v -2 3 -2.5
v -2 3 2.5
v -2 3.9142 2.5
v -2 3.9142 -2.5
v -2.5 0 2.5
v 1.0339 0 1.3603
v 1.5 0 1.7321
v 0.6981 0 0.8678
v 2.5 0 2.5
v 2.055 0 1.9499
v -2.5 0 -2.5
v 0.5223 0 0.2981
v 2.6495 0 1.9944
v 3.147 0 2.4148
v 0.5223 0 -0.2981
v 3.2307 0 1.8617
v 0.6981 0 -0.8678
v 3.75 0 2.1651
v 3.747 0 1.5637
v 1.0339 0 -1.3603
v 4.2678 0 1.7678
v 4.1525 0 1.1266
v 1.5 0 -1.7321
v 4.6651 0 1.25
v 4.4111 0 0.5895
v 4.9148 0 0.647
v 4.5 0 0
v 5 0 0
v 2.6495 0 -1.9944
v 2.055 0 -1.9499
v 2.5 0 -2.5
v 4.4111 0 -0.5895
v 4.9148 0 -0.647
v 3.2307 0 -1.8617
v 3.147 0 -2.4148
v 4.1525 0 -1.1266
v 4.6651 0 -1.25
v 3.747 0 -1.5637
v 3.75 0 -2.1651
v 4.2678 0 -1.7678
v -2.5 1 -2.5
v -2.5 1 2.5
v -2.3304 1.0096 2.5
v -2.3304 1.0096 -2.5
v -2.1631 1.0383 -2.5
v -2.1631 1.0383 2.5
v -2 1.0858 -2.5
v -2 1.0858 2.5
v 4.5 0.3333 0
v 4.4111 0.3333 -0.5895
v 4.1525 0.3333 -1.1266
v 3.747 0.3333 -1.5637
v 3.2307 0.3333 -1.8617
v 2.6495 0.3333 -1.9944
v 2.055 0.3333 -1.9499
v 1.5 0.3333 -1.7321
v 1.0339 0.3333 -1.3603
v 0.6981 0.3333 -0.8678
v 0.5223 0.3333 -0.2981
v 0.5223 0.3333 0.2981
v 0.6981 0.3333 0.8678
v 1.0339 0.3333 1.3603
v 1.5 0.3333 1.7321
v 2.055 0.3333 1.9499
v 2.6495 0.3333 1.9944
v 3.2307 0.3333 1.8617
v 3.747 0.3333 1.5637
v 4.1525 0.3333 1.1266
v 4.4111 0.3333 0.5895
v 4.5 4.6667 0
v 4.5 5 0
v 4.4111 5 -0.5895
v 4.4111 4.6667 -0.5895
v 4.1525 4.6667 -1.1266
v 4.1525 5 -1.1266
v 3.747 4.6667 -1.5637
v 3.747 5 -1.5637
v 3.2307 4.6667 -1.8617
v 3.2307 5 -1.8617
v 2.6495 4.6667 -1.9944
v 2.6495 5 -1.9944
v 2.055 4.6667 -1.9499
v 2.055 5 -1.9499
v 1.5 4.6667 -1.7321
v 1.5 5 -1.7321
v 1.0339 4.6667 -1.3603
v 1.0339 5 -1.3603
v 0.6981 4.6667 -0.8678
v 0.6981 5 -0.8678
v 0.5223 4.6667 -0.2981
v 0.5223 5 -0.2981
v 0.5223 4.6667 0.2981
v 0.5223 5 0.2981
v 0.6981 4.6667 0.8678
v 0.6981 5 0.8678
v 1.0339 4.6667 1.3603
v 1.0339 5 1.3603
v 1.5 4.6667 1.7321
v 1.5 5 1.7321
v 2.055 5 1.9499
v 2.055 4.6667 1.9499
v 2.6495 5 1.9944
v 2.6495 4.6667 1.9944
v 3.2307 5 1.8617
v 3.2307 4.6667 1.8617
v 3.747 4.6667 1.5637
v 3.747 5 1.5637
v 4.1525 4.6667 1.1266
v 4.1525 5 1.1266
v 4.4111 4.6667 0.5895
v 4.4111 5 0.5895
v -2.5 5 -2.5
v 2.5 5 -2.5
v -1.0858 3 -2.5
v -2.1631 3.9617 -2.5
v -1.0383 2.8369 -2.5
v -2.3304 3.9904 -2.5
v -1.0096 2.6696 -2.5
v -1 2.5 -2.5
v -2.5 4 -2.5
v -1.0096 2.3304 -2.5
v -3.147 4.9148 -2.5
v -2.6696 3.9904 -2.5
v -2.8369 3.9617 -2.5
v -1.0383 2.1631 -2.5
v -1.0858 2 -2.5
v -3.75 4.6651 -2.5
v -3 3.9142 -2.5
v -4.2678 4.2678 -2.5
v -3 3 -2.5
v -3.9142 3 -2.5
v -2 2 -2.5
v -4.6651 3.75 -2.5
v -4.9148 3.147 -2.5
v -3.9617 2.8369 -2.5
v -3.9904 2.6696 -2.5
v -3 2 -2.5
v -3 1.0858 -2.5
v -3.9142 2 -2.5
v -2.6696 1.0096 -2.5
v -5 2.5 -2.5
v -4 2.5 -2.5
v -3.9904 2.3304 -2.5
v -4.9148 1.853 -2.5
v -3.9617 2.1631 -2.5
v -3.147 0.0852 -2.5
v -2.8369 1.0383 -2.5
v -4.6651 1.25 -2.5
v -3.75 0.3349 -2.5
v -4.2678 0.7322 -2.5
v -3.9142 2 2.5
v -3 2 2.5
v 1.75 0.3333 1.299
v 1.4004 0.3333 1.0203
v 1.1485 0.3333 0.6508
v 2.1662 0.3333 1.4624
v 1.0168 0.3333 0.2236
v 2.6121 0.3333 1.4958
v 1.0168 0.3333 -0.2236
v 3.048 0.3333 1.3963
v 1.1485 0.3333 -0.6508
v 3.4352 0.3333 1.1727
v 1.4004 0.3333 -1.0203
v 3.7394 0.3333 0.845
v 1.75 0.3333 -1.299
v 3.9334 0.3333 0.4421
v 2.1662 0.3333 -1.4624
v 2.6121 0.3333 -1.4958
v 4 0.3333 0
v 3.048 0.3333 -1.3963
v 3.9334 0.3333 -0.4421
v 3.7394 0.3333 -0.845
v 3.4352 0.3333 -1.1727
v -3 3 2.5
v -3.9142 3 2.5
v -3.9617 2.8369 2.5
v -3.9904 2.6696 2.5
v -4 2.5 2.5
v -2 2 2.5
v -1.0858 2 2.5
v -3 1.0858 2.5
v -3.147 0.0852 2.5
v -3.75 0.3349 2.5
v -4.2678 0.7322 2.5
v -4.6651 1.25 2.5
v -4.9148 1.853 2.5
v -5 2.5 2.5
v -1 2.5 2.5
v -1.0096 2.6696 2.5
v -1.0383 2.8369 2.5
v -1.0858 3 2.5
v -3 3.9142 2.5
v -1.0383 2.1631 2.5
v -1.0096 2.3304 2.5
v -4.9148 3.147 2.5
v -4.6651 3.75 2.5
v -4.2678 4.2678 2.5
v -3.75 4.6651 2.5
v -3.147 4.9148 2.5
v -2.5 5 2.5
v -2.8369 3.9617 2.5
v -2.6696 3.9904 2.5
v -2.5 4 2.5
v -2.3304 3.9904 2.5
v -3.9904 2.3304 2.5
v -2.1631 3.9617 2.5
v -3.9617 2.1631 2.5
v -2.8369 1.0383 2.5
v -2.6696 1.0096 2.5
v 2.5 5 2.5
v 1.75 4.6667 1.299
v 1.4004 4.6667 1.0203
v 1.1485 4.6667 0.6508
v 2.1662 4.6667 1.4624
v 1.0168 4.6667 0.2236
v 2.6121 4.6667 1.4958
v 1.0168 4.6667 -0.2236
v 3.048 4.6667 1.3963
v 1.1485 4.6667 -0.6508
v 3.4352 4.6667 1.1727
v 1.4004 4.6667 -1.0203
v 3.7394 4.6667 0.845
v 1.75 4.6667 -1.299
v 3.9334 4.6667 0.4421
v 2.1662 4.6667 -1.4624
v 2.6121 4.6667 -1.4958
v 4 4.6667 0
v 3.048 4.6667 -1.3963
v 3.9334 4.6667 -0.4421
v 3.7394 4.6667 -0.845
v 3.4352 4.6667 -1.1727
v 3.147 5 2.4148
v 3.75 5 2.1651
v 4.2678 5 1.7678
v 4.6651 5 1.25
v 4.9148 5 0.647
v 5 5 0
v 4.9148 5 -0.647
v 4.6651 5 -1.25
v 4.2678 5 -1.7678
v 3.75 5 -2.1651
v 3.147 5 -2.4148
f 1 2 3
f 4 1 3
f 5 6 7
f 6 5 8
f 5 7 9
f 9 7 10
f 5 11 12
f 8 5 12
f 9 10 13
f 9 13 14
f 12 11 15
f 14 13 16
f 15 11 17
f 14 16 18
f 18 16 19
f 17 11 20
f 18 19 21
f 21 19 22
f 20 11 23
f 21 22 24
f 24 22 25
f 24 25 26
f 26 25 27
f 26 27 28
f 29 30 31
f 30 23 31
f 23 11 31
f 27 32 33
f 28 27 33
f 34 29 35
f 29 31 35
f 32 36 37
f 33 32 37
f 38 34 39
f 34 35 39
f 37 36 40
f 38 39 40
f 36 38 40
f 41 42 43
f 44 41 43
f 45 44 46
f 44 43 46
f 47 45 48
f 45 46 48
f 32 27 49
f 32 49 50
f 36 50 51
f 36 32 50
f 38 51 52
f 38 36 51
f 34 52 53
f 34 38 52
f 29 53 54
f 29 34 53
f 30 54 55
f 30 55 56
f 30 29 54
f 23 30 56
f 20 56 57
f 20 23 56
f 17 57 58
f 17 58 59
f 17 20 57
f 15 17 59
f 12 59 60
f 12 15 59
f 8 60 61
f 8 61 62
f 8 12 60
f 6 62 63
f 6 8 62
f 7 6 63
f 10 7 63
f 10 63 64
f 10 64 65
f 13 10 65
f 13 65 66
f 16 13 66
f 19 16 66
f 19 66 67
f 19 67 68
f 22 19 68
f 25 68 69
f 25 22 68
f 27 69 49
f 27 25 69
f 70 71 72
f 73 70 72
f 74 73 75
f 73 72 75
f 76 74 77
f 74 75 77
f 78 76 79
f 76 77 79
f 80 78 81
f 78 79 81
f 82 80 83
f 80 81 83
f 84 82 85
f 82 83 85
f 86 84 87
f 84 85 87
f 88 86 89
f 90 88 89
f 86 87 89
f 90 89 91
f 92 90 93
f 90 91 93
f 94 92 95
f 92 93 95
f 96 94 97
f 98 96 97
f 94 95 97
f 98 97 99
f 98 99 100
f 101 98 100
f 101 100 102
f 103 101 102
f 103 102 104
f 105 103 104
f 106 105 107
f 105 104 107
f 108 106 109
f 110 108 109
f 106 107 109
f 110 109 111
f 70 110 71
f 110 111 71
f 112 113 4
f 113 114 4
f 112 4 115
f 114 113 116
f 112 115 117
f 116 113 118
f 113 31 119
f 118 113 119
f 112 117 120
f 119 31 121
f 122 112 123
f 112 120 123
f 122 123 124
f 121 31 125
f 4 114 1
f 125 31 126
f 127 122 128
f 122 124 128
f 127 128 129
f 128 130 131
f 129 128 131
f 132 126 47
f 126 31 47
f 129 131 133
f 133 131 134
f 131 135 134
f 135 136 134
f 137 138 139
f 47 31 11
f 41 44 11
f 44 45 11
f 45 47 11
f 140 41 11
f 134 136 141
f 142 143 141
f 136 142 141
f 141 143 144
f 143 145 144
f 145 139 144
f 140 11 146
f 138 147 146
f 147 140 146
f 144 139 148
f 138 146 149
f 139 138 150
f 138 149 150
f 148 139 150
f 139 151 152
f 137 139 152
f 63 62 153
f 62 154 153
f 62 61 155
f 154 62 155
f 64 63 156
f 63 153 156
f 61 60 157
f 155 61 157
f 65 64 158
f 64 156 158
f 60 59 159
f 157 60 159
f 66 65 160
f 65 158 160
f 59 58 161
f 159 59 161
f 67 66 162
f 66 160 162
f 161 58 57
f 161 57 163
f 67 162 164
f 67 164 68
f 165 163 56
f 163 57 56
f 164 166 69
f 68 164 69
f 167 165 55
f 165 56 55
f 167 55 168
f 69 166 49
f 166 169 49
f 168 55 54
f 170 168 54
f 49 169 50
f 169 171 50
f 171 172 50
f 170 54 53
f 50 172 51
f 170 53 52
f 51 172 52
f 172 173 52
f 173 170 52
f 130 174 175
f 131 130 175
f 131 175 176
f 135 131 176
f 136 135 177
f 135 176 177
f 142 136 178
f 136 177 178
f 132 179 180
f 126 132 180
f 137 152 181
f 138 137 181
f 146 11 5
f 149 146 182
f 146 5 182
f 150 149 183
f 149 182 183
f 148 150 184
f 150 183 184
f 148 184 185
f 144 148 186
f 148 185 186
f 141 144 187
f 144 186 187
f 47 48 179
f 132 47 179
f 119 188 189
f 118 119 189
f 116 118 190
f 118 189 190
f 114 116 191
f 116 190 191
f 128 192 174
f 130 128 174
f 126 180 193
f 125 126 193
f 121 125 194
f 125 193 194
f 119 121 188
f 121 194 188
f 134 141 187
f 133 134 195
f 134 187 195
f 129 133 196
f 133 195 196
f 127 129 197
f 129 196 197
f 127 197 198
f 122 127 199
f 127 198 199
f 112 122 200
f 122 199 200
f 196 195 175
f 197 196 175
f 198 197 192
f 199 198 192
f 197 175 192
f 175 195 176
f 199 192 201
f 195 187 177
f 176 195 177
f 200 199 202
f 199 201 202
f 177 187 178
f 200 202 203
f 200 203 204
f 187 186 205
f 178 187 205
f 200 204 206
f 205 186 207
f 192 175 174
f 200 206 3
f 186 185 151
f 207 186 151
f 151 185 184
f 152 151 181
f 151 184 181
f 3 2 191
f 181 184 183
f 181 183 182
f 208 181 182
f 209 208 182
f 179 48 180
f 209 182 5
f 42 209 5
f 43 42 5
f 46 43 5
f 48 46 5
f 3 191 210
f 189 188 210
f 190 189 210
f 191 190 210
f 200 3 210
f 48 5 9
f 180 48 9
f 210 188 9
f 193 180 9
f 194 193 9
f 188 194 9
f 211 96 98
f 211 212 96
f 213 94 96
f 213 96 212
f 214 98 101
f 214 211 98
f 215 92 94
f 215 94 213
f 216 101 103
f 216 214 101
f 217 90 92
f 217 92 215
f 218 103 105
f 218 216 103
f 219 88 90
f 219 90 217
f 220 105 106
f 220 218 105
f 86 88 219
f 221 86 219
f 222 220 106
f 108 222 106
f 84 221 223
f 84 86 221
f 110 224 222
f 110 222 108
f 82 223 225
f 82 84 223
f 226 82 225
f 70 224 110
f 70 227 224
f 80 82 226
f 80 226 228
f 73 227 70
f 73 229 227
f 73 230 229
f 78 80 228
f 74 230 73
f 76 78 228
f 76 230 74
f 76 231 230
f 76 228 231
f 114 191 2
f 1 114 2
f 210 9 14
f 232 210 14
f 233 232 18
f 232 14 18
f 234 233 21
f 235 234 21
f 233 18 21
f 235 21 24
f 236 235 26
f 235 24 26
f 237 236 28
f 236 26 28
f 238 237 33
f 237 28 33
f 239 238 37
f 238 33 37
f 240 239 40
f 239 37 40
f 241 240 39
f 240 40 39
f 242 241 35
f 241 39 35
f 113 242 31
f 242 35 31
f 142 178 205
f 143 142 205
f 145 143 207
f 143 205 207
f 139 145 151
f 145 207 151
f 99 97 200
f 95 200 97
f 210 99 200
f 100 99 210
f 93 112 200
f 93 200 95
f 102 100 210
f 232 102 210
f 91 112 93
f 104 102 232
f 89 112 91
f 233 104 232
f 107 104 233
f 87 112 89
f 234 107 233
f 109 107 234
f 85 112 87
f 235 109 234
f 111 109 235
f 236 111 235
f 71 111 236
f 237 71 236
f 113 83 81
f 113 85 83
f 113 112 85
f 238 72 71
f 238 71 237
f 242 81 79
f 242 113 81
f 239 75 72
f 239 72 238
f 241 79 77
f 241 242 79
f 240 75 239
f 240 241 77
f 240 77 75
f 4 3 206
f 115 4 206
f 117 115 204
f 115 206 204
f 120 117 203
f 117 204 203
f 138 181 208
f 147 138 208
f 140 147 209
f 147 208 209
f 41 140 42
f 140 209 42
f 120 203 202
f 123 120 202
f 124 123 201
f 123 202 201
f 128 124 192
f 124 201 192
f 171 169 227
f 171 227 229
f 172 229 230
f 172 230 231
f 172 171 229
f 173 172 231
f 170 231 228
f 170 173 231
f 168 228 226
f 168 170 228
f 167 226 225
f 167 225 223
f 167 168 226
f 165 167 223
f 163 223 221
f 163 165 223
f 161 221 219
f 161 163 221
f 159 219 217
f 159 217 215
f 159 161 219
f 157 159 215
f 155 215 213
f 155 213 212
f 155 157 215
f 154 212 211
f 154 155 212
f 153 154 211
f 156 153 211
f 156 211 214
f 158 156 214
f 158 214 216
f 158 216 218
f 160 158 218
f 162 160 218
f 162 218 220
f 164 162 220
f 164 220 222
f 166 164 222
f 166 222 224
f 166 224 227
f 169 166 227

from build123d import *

# Parameters (mm, degrees)
SKETCH1_R           = 2.5
SKETCH1_R_2         = 2
SKETCH1_R_3         = 1.5
BOSS_EXTRUDE1_DEPTH = 5
SKETCH1_3_R         = 2
SKETCH1_3_R_2       = 1.5
CUT_EXTRUDE1_DEPTH  = 0.333333333
SKETCH2_R           = 2
SKETCH2_R_2         = 1.5
CUT_EXTRUDE2_DEPTH  = 0.333333333
CUT_EXTRUDE3_REACH  = 7
SKETCH3_W           = 1
SKETCH3_H           = 1


with BuildPart() as part:
    # Sketch1 → Boss-Extrude1 (new body)
    with BuildSketch(Plane(origin=(0, 0, 0), x_dir=(1, 0, 0), z_dir=(0, 1, 0))):
        with BuildLine():
            Line((-5, 2.5), (-5, -2.5))
            Line((-5, -2.5), (2.5, -2.5))
            ThreePointArc((2.5, -2.5), (0, 0), (2.5, 2.5))
            Line((2.5, 2.5), (-5, 2.5))
        make_face()
        with Locations((2.5, 0)):
            Circle(SKETCH1_R)
        with Locations((2.5, 0)):
            Circle(SKETCH1_R_2, mode=Mode.SUBTRACT)
        with Locations((2.5, 0)):
            Circle(SKETCH1_R_2)
        with Locations((2.5, 0)):
            Circle(SKETCH1_R_3, mode=Mode.SUBTRACT)
    extrude(amount=BOSS_EXTRUDE1_DEPTH)

    # Sketch1<3> → Cut-Extrude1 (cut)
    with BuildSketch(Plane(origin=(0, 0, 0), x_dir=(1, 0, 0), z_dir=(0, 1, 0))):
        with Locations((2.5, 0)):
            Circle(SKETCH1_3_R)
        with Locations((2.5, 0)):
            Circle(SKETCH1_3_R_2, mode=Mode.SUBTRACT)
    extrude(amount=CUT_EXTRUDE1_DEPTH, mode=Mode.SUBTRACT)

    # Sketch2 → Cut-Extrude2 (cut)
    with BuildSketch(Plane(origin=(0, 5, 0), x_dir=(1, 0, 0), z_dir=(0, 1, 0))):
        with Locations((2.5, 0)):
            Circle(SKETCH2_R)
        with Locations((2.5, 0)):
            Circle(SKETCH2_R_2, mode=Mode.SUBTRACT)
    extrude(amount=-CUT_EXTRUDE2_DEPTH, mode=Mode.SUBTRACT)

    # Sketch3 → Cut-Extrude3 (cut, up to next)
    with BuildSketch(Plane.XY.offset(2.5), mode=Mode.PRIVATE) as cut_extrude3_sk1:
        with BuildLine():
            Line((-2.5, 5), (-5, 5))
            Line((-5, 5), (-5, 2.5))
            ThreePointArc((-5, 2.5), (-4.267766953, 4.267766953), (-2.5, 5))
        make_face()
    cut_extrude3_tool1 = extrude(cut_extrude3_sk1.sketch, amount=-CUT_EXTRUDE3_REACH, mode=Mode.PRIVATE) & part.part
    add(cut_extrude3_tool1.solids().sort_by_distance((-4.44158, 4.44158, 2.5))[0], mode=Mode.SUBTRACT)
    # Sketch3 → Cut-Extrude3 (cut, up to next)
    with BuildSketch(Plane.XY.offset(2.5), mode=Mode.PRIVATE) as cut_extrude3_sk2:
        with BuildLine():
            ThreePointArc((-2.5, 0), (-4.267766953, 0.732233047), (-5, 2.5))
            Line((-5, 2.5), (-5, 0))
            Line((-5, 0), (-2.5, 0))
        make_face()
    cut_extrude3_tool2 = extrude(cut_extrude3_sk2.sketch, amount=-CUT_EXTRUDE3_REACH, mode=Mode.PRIVATE) & part.part
    add(cut_extrude3_tool2.solids().sort_by_distance((-4.44158, 0.55842, 2.5))[0], mode=Mode.SUBTRACT)
    # Sketch3 → Cut-Extrude3 (cut, up to next)
    with BuildSketch(Plane.XY.offset(2.5), mode=Mode.PRIVATE) as cut_extrude3_sk3:
        with BuildLine():
            Line((-3.914213562, 2), (-3, 2))
            Line((-3, 2), (-3, 3))
            Line((-3, 3), (-3.914213562, 3))
            ThreePointArc((-3.914213562, 3), (-3.978397839, 2.753652968), (-4, 2.5))
            ThreePointArc((-4, 2.5), (-3.978397839, 2.246347032), (-3.914213562, 2))
        make_face()
    cut_extrude3_tool3 = extrude(cut_extrude3_sk3.sketch, amount=-CUT_EXTRUDE3_REACH, mode=Mode.PRIVATE) & part.part
    add(cut_extrude3_tool3.solids().sort_by_distance((-3.486204, 2.5, 2.5))[0], mode=Mode.SUBTRACT)
    # Sketch3 → Cut-Extrude3 (cut, up to next)
    with BuildSketch(Plane.XY.offset(2.5), mode=Mode.PRIVATE) as cut_extrude3_sk4:
        with BuildLine():
            Line((-3, 3.914213562), (-3, 3))
            Line((-3, 3), (-2, 3))
            Line((-2, 3), (-2, 3.914213562))
            ThreePointArc((-2, 3.914213562), (-2.246347032, 3.978397839), (-2.5, 4))
            ThreePointArc((-2.5, 4), (-2.753652968, 3.978397839), (-3, 3.914213562))
        make_face()
    cut_extrude3_tool4 = extrude(cut_extrude3_sk4.sketch, amount=-CUT_EXTRUDE3_REACH, mode=Mode.PRIVATE) & part.part
    add(cut_extrude3_tool4.solids().sort_by_distance((-2.5, 3.486204, 2.5))[0], mode=Mode.SUBTRACT)
    # Sketch3 → Cut-Extrude3 (cut, up to next)
    with BuildSketch(Plane.XY.offset(2.5), mode=Mode.PRIVATE) as cut_extrude3_sk5:
        with Locations((-2.5, 2.5)):
            Rectangle(SKETCH3_W, SKETCH3_H)
    cut_extrude3_tool5 = extrude(cut_extrude3_sk5.sketch, amount=-CUT_EXTRUDE3_REACH, mode=Mode.PRIVATE) & part.part
    add(cut_extrude3_tool5.solids().sort_by_distance((-2.5, 2.5, 2.5))[0], mode=Mode.SUBTRACT)
    # Sketch3 → Cut-Extrude3 (cut, up to next)
    with BuildSketch(Plane.XY.offset(2.5), mode=Mode.PRIVATE) as cut_extrude3_sk6:
        with BuildLine():
            Line((-2, 3), (-2, 2))
            Line((-2, 2), (-1.085786438, 2))
            ThreePointArc((-1.085786438, 2), (-1.021602161, 2.246347032), (-1, 2.5))
            ThreePointArc((-1, 2.5), (-1.021602161, 2.753652968), (-1.085786438, 3))
            Line((-1.085786438, 3), (-2, 3))
        make_face()
    cut_extrude3_tool6 = extrude(cut_extrude3_sk6.sketch, amount=-CUT_EXTRUDE3_REACH, mode=Mode.PRIVATE) & part.part
    add(cut_extrude3_tool6.solids().sort_by_distance((-1.513796, 2.5, 2.5))[0], mode=Mode.SUBTRACT)
    # Sketch3 → Cut-Extrude3 (cut, up to next)
    with BuildSketch(Plane.XY.offset(2.5), mode=Mode.PRIVATE) as cut_extrude3_sk7:
        with BuildLine():
            ThreePointArc((-3, 1.085786438), (-2.753652968, 1.021602161), (-2.5, 1))
            ThreePointArc((-2.5, 1), (-2.246347032, 1.021602161), (-2, 1.085786438))
            Line((-2, 1.085786438), (-2, 2))
            Line((-2, 2), (-3, 2))
            Line((-3, 2), (-3, 1.085786438))
        make_face()
    cut_extrude3_tool7 = extrude(cut_extrude3_sk7.sketch, amount=-CUT_EXTRUDE3_REACH, mode=Mode.PRIVATE) & part.part
    add(cut_extrude3_tool7.solids().sort_by_distance((-2.5, 1.513796, 2.5))[0], mode=Mode.SUBTRACT)


solid = part.part
